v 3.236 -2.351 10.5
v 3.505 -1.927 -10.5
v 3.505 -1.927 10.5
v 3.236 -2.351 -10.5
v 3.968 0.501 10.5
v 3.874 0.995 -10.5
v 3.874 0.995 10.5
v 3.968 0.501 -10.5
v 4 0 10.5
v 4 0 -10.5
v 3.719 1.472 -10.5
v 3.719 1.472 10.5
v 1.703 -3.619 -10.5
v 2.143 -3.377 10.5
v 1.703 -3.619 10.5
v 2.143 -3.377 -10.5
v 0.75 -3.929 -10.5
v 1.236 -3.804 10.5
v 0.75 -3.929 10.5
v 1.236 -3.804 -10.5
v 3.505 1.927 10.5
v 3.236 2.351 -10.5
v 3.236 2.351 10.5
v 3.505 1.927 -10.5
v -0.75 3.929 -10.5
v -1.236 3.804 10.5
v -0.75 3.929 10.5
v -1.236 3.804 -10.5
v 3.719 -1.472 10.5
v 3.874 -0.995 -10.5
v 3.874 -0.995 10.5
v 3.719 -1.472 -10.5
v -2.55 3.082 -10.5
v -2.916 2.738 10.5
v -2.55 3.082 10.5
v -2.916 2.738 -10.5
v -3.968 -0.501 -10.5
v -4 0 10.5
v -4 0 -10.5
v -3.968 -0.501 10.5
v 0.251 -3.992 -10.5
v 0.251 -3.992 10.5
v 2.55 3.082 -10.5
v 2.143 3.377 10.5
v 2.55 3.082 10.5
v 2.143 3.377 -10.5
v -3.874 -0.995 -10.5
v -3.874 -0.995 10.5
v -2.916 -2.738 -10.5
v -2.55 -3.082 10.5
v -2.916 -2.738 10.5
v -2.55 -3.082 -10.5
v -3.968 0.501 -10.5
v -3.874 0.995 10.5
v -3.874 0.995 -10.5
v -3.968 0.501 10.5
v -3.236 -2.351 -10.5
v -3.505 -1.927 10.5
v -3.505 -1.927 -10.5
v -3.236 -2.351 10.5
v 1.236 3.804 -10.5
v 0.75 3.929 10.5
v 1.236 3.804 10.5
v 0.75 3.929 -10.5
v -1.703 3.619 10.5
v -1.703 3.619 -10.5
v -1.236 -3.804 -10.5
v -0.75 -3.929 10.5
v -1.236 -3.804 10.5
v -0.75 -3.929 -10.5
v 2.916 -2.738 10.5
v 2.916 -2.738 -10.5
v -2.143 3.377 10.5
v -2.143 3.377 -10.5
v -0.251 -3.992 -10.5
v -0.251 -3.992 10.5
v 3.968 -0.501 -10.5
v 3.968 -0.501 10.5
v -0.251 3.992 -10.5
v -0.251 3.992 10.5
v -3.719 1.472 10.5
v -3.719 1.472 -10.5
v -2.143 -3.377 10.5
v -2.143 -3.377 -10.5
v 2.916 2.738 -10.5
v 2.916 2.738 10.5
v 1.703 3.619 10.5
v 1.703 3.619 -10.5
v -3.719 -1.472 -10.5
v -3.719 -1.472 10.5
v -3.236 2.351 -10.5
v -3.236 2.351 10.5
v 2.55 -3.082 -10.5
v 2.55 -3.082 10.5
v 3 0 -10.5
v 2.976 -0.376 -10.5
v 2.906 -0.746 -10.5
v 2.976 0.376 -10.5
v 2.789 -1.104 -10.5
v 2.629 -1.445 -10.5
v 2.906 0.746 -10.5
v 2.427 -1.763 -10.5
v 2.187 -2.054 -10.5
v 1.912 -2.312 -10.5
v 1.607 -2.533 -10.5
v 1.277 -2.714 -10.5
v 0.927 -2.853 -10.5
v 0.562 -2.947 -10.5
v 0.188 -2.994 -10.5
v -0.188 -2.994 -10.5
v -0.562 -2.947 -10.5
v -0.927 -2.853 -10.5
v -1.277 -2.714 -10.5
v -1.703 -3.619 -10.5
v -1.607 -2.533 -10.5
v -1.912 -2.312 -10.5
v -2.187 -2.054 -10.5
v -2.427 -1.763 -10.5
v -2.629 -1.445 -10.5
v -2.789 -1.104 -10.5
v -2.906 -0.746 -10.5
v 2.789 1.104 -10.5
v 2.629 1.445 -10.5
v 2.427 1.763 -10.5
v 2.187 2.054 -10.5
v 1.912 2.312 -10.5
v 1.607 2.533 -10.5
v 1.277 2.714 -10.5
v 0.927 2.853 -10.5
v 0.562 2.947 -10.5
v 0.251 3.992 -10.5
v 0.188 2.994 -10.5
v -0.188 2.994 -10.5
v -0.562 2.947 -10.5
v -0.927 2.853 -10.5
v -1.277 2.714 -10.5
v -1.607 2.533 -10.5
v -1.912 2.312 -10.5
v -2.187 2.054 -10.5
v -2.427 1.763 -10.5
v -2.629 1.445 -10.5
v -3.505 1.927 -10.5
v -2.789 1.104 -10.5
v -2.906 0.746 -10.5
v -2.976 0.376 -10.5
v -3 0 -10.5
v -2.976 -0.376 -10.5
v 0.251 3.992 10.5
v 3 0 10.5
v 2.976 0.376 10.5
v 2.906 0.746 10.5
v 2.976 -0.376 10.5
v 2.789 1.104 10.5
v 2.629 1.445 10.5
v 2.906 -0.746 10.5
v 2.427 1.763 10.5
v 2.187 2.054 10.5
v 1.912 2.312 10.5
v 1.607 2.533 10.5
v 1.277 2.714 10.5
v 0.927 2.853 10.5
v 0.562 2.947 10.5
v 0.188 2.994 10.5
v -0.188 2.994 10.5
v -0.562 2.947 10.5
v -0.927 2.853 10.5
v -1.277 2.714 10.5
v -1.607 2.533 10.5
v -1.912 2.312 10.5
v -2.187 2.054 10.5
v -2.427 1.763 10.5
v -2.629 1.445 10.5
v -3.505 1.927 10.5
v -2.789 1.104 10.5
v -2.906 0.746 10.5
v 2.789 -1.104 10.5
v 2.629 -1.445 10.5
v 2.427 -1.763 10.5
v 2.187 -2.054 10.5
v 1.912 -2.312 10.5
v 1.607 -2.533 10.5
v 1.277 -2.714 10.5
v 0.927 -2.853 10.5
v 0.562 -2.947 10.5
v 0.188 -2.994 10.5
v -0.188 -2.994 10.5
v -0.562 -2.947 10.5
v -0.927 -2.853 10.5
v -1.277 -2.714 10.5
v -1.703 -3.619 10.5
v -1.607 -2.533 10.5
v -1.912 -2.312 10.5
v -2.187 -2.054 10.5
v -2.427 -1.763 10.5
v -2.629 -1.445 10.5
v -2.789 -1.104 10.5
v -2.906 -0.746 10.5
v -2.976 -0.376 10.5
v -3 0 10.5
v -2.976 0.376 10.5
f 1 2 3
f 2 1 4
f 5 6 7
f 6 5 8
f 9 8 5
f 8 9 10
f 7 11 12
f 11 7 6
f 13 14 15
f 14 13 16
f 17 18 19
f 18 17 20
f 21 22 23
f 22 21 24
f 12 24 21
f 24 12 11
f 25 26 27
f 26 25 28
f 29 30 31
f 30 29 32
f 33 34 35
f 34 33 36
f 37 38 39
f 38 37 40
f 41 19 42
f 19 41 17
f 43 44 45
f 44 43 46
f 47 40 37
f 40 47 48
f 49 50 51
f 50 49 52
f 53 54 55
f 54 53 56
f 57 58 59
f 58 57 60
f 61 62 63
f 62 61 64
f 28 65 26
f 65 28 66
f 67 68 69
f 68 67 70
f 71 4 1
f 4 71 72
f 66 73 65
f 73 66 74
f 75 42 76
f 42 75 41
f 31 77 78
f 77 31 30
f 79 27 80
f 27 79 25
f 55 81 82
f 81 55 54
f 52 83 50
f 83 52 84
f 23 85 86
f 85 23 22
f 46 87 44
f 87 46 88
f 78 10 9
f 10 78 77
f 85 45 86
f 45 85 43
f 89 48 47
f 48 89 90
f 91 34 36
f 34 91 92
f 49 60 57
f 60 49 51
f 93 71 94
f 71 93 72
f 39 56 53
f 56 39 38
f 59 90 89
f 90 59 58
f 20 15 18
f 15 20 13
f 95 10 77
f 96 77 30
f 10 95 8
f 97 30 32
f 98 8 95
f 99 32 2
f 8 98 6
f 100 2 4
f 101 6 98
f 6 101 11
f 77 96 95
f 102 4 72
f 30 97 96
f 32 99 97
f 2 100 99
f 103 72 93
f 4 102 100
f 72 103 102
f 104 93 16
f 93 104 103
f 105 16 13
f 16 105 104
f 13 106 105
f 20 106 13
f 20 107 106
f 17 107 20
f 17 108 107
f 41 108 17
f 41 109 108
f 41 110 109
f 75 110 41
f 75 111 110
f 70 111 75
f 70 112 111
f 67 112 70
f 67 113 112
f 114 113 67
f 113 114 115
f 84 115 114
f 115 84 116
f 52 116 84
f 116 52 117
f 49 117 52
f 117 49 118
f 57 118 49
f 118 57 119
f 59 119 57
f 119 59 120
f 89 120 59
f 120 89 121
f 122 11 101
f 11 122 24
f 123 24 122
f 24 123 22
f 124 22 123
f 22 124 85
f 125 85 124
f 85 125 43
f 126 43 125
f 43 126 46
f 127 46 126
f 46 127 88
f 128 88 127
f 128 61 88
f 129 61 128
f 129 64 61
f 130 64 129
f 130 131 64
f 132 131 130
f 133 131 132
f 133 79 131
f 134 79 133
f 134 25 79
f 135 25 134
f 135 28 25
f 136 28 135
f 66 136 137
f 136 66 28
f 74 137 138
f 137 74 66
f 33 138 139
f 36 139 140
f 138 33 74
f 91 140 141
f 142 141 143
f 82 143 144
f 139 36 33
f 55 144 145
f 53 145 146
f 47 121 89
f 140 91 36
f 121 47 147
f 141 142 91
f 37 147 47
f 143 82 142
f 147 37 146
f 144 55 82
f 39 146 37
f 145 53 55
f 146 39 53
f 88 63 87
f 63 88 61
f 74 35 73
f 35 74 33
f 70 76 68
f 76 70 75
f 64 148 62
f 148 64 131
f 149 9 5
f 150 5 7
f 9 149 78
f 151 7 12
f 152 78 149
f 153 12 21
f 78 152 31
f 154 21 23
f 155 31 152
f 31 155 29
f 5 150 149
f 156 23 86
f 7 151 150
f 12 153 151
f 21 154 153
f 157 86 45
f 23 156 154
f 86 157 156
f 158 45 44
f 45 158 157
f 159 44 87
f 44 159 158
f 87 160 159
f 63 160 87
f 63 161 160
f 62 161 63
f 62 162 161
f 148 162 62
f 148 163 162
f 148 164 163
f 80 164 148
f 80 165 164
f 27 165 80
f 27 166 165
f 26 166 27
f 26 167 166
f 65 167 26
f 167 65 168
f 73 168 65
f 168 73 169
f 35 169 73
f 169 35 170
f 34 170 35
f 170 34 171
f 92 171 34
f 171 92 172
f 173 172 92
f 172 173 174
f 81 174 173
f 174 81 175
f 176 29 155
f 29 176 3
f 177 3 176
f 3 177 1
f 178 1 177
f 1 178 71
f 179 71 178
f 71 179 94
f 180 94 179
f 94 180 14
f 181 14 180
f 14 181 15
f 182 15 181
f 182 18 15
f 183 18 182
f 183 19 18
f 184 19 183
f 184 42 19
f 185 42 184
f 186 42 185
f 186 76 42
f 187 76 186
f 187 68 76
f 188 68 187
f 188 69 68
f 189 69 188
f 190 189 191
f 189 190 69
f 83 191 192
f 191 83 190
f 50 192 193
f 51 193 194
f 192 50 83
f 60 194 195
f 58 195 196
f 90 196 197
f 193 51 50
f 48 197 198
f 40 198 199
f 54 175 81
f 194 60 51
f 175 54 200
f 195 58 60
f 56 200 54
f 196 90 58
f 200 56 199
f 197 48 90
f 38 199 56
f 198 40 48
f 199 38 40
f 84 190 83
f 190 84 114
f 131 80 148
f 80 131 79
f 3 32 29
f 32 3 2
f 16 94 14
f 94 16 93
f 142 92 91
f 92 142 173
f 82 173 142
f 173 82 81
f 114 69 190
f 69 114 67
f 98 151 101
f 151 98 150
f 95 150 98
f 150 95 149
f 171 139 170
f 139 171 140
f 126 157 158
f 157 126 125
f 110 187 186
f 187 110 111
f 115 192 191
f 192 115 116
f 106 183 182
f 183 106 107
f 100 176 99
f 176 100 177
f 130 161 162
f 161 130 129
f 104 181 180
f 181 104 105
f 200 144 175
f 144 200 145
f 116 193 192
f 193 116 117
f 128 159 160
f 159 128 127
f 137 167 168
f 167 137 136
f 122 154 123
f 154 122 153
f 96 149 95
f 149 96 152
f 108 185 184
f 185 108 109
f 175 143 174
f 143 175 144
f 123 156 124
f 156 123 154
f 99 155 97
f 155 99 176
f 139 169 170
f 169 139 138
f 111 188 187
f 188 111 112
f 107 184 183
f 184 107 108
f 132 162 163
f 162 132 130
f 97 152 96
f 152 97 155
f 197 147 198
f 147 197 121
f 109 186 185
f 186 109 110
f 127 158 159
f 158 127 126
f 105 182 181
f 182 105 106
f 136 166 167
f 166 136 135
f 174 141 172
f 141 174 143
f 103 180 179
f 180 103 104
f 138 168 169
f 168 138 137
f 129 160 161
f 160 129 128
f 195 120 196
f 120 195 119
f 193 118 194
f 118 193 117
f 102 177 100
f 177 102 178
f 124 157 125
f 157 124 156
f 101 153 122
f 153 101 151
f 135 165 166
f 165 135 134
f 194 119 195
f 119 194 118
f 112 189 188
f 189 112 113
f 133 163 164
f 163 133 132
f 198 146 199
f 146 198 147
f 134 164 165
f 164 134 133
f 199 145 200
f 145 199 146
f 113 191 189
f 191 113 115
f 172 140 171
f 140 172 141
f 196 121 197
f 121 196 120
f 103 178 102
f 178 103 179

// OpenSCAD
$fn = 50;


difference() {
	union() {
		translate(v = [0, 0, -10.5000000000]) {
			cylinder(h = 21, r = 4.0000000000);
		}
	}
	union() {
		translate(v = [0, 0, -100.0000000000]) {
			cylinder(h = 200, r = 3.0000000000);
		}
	}
}
